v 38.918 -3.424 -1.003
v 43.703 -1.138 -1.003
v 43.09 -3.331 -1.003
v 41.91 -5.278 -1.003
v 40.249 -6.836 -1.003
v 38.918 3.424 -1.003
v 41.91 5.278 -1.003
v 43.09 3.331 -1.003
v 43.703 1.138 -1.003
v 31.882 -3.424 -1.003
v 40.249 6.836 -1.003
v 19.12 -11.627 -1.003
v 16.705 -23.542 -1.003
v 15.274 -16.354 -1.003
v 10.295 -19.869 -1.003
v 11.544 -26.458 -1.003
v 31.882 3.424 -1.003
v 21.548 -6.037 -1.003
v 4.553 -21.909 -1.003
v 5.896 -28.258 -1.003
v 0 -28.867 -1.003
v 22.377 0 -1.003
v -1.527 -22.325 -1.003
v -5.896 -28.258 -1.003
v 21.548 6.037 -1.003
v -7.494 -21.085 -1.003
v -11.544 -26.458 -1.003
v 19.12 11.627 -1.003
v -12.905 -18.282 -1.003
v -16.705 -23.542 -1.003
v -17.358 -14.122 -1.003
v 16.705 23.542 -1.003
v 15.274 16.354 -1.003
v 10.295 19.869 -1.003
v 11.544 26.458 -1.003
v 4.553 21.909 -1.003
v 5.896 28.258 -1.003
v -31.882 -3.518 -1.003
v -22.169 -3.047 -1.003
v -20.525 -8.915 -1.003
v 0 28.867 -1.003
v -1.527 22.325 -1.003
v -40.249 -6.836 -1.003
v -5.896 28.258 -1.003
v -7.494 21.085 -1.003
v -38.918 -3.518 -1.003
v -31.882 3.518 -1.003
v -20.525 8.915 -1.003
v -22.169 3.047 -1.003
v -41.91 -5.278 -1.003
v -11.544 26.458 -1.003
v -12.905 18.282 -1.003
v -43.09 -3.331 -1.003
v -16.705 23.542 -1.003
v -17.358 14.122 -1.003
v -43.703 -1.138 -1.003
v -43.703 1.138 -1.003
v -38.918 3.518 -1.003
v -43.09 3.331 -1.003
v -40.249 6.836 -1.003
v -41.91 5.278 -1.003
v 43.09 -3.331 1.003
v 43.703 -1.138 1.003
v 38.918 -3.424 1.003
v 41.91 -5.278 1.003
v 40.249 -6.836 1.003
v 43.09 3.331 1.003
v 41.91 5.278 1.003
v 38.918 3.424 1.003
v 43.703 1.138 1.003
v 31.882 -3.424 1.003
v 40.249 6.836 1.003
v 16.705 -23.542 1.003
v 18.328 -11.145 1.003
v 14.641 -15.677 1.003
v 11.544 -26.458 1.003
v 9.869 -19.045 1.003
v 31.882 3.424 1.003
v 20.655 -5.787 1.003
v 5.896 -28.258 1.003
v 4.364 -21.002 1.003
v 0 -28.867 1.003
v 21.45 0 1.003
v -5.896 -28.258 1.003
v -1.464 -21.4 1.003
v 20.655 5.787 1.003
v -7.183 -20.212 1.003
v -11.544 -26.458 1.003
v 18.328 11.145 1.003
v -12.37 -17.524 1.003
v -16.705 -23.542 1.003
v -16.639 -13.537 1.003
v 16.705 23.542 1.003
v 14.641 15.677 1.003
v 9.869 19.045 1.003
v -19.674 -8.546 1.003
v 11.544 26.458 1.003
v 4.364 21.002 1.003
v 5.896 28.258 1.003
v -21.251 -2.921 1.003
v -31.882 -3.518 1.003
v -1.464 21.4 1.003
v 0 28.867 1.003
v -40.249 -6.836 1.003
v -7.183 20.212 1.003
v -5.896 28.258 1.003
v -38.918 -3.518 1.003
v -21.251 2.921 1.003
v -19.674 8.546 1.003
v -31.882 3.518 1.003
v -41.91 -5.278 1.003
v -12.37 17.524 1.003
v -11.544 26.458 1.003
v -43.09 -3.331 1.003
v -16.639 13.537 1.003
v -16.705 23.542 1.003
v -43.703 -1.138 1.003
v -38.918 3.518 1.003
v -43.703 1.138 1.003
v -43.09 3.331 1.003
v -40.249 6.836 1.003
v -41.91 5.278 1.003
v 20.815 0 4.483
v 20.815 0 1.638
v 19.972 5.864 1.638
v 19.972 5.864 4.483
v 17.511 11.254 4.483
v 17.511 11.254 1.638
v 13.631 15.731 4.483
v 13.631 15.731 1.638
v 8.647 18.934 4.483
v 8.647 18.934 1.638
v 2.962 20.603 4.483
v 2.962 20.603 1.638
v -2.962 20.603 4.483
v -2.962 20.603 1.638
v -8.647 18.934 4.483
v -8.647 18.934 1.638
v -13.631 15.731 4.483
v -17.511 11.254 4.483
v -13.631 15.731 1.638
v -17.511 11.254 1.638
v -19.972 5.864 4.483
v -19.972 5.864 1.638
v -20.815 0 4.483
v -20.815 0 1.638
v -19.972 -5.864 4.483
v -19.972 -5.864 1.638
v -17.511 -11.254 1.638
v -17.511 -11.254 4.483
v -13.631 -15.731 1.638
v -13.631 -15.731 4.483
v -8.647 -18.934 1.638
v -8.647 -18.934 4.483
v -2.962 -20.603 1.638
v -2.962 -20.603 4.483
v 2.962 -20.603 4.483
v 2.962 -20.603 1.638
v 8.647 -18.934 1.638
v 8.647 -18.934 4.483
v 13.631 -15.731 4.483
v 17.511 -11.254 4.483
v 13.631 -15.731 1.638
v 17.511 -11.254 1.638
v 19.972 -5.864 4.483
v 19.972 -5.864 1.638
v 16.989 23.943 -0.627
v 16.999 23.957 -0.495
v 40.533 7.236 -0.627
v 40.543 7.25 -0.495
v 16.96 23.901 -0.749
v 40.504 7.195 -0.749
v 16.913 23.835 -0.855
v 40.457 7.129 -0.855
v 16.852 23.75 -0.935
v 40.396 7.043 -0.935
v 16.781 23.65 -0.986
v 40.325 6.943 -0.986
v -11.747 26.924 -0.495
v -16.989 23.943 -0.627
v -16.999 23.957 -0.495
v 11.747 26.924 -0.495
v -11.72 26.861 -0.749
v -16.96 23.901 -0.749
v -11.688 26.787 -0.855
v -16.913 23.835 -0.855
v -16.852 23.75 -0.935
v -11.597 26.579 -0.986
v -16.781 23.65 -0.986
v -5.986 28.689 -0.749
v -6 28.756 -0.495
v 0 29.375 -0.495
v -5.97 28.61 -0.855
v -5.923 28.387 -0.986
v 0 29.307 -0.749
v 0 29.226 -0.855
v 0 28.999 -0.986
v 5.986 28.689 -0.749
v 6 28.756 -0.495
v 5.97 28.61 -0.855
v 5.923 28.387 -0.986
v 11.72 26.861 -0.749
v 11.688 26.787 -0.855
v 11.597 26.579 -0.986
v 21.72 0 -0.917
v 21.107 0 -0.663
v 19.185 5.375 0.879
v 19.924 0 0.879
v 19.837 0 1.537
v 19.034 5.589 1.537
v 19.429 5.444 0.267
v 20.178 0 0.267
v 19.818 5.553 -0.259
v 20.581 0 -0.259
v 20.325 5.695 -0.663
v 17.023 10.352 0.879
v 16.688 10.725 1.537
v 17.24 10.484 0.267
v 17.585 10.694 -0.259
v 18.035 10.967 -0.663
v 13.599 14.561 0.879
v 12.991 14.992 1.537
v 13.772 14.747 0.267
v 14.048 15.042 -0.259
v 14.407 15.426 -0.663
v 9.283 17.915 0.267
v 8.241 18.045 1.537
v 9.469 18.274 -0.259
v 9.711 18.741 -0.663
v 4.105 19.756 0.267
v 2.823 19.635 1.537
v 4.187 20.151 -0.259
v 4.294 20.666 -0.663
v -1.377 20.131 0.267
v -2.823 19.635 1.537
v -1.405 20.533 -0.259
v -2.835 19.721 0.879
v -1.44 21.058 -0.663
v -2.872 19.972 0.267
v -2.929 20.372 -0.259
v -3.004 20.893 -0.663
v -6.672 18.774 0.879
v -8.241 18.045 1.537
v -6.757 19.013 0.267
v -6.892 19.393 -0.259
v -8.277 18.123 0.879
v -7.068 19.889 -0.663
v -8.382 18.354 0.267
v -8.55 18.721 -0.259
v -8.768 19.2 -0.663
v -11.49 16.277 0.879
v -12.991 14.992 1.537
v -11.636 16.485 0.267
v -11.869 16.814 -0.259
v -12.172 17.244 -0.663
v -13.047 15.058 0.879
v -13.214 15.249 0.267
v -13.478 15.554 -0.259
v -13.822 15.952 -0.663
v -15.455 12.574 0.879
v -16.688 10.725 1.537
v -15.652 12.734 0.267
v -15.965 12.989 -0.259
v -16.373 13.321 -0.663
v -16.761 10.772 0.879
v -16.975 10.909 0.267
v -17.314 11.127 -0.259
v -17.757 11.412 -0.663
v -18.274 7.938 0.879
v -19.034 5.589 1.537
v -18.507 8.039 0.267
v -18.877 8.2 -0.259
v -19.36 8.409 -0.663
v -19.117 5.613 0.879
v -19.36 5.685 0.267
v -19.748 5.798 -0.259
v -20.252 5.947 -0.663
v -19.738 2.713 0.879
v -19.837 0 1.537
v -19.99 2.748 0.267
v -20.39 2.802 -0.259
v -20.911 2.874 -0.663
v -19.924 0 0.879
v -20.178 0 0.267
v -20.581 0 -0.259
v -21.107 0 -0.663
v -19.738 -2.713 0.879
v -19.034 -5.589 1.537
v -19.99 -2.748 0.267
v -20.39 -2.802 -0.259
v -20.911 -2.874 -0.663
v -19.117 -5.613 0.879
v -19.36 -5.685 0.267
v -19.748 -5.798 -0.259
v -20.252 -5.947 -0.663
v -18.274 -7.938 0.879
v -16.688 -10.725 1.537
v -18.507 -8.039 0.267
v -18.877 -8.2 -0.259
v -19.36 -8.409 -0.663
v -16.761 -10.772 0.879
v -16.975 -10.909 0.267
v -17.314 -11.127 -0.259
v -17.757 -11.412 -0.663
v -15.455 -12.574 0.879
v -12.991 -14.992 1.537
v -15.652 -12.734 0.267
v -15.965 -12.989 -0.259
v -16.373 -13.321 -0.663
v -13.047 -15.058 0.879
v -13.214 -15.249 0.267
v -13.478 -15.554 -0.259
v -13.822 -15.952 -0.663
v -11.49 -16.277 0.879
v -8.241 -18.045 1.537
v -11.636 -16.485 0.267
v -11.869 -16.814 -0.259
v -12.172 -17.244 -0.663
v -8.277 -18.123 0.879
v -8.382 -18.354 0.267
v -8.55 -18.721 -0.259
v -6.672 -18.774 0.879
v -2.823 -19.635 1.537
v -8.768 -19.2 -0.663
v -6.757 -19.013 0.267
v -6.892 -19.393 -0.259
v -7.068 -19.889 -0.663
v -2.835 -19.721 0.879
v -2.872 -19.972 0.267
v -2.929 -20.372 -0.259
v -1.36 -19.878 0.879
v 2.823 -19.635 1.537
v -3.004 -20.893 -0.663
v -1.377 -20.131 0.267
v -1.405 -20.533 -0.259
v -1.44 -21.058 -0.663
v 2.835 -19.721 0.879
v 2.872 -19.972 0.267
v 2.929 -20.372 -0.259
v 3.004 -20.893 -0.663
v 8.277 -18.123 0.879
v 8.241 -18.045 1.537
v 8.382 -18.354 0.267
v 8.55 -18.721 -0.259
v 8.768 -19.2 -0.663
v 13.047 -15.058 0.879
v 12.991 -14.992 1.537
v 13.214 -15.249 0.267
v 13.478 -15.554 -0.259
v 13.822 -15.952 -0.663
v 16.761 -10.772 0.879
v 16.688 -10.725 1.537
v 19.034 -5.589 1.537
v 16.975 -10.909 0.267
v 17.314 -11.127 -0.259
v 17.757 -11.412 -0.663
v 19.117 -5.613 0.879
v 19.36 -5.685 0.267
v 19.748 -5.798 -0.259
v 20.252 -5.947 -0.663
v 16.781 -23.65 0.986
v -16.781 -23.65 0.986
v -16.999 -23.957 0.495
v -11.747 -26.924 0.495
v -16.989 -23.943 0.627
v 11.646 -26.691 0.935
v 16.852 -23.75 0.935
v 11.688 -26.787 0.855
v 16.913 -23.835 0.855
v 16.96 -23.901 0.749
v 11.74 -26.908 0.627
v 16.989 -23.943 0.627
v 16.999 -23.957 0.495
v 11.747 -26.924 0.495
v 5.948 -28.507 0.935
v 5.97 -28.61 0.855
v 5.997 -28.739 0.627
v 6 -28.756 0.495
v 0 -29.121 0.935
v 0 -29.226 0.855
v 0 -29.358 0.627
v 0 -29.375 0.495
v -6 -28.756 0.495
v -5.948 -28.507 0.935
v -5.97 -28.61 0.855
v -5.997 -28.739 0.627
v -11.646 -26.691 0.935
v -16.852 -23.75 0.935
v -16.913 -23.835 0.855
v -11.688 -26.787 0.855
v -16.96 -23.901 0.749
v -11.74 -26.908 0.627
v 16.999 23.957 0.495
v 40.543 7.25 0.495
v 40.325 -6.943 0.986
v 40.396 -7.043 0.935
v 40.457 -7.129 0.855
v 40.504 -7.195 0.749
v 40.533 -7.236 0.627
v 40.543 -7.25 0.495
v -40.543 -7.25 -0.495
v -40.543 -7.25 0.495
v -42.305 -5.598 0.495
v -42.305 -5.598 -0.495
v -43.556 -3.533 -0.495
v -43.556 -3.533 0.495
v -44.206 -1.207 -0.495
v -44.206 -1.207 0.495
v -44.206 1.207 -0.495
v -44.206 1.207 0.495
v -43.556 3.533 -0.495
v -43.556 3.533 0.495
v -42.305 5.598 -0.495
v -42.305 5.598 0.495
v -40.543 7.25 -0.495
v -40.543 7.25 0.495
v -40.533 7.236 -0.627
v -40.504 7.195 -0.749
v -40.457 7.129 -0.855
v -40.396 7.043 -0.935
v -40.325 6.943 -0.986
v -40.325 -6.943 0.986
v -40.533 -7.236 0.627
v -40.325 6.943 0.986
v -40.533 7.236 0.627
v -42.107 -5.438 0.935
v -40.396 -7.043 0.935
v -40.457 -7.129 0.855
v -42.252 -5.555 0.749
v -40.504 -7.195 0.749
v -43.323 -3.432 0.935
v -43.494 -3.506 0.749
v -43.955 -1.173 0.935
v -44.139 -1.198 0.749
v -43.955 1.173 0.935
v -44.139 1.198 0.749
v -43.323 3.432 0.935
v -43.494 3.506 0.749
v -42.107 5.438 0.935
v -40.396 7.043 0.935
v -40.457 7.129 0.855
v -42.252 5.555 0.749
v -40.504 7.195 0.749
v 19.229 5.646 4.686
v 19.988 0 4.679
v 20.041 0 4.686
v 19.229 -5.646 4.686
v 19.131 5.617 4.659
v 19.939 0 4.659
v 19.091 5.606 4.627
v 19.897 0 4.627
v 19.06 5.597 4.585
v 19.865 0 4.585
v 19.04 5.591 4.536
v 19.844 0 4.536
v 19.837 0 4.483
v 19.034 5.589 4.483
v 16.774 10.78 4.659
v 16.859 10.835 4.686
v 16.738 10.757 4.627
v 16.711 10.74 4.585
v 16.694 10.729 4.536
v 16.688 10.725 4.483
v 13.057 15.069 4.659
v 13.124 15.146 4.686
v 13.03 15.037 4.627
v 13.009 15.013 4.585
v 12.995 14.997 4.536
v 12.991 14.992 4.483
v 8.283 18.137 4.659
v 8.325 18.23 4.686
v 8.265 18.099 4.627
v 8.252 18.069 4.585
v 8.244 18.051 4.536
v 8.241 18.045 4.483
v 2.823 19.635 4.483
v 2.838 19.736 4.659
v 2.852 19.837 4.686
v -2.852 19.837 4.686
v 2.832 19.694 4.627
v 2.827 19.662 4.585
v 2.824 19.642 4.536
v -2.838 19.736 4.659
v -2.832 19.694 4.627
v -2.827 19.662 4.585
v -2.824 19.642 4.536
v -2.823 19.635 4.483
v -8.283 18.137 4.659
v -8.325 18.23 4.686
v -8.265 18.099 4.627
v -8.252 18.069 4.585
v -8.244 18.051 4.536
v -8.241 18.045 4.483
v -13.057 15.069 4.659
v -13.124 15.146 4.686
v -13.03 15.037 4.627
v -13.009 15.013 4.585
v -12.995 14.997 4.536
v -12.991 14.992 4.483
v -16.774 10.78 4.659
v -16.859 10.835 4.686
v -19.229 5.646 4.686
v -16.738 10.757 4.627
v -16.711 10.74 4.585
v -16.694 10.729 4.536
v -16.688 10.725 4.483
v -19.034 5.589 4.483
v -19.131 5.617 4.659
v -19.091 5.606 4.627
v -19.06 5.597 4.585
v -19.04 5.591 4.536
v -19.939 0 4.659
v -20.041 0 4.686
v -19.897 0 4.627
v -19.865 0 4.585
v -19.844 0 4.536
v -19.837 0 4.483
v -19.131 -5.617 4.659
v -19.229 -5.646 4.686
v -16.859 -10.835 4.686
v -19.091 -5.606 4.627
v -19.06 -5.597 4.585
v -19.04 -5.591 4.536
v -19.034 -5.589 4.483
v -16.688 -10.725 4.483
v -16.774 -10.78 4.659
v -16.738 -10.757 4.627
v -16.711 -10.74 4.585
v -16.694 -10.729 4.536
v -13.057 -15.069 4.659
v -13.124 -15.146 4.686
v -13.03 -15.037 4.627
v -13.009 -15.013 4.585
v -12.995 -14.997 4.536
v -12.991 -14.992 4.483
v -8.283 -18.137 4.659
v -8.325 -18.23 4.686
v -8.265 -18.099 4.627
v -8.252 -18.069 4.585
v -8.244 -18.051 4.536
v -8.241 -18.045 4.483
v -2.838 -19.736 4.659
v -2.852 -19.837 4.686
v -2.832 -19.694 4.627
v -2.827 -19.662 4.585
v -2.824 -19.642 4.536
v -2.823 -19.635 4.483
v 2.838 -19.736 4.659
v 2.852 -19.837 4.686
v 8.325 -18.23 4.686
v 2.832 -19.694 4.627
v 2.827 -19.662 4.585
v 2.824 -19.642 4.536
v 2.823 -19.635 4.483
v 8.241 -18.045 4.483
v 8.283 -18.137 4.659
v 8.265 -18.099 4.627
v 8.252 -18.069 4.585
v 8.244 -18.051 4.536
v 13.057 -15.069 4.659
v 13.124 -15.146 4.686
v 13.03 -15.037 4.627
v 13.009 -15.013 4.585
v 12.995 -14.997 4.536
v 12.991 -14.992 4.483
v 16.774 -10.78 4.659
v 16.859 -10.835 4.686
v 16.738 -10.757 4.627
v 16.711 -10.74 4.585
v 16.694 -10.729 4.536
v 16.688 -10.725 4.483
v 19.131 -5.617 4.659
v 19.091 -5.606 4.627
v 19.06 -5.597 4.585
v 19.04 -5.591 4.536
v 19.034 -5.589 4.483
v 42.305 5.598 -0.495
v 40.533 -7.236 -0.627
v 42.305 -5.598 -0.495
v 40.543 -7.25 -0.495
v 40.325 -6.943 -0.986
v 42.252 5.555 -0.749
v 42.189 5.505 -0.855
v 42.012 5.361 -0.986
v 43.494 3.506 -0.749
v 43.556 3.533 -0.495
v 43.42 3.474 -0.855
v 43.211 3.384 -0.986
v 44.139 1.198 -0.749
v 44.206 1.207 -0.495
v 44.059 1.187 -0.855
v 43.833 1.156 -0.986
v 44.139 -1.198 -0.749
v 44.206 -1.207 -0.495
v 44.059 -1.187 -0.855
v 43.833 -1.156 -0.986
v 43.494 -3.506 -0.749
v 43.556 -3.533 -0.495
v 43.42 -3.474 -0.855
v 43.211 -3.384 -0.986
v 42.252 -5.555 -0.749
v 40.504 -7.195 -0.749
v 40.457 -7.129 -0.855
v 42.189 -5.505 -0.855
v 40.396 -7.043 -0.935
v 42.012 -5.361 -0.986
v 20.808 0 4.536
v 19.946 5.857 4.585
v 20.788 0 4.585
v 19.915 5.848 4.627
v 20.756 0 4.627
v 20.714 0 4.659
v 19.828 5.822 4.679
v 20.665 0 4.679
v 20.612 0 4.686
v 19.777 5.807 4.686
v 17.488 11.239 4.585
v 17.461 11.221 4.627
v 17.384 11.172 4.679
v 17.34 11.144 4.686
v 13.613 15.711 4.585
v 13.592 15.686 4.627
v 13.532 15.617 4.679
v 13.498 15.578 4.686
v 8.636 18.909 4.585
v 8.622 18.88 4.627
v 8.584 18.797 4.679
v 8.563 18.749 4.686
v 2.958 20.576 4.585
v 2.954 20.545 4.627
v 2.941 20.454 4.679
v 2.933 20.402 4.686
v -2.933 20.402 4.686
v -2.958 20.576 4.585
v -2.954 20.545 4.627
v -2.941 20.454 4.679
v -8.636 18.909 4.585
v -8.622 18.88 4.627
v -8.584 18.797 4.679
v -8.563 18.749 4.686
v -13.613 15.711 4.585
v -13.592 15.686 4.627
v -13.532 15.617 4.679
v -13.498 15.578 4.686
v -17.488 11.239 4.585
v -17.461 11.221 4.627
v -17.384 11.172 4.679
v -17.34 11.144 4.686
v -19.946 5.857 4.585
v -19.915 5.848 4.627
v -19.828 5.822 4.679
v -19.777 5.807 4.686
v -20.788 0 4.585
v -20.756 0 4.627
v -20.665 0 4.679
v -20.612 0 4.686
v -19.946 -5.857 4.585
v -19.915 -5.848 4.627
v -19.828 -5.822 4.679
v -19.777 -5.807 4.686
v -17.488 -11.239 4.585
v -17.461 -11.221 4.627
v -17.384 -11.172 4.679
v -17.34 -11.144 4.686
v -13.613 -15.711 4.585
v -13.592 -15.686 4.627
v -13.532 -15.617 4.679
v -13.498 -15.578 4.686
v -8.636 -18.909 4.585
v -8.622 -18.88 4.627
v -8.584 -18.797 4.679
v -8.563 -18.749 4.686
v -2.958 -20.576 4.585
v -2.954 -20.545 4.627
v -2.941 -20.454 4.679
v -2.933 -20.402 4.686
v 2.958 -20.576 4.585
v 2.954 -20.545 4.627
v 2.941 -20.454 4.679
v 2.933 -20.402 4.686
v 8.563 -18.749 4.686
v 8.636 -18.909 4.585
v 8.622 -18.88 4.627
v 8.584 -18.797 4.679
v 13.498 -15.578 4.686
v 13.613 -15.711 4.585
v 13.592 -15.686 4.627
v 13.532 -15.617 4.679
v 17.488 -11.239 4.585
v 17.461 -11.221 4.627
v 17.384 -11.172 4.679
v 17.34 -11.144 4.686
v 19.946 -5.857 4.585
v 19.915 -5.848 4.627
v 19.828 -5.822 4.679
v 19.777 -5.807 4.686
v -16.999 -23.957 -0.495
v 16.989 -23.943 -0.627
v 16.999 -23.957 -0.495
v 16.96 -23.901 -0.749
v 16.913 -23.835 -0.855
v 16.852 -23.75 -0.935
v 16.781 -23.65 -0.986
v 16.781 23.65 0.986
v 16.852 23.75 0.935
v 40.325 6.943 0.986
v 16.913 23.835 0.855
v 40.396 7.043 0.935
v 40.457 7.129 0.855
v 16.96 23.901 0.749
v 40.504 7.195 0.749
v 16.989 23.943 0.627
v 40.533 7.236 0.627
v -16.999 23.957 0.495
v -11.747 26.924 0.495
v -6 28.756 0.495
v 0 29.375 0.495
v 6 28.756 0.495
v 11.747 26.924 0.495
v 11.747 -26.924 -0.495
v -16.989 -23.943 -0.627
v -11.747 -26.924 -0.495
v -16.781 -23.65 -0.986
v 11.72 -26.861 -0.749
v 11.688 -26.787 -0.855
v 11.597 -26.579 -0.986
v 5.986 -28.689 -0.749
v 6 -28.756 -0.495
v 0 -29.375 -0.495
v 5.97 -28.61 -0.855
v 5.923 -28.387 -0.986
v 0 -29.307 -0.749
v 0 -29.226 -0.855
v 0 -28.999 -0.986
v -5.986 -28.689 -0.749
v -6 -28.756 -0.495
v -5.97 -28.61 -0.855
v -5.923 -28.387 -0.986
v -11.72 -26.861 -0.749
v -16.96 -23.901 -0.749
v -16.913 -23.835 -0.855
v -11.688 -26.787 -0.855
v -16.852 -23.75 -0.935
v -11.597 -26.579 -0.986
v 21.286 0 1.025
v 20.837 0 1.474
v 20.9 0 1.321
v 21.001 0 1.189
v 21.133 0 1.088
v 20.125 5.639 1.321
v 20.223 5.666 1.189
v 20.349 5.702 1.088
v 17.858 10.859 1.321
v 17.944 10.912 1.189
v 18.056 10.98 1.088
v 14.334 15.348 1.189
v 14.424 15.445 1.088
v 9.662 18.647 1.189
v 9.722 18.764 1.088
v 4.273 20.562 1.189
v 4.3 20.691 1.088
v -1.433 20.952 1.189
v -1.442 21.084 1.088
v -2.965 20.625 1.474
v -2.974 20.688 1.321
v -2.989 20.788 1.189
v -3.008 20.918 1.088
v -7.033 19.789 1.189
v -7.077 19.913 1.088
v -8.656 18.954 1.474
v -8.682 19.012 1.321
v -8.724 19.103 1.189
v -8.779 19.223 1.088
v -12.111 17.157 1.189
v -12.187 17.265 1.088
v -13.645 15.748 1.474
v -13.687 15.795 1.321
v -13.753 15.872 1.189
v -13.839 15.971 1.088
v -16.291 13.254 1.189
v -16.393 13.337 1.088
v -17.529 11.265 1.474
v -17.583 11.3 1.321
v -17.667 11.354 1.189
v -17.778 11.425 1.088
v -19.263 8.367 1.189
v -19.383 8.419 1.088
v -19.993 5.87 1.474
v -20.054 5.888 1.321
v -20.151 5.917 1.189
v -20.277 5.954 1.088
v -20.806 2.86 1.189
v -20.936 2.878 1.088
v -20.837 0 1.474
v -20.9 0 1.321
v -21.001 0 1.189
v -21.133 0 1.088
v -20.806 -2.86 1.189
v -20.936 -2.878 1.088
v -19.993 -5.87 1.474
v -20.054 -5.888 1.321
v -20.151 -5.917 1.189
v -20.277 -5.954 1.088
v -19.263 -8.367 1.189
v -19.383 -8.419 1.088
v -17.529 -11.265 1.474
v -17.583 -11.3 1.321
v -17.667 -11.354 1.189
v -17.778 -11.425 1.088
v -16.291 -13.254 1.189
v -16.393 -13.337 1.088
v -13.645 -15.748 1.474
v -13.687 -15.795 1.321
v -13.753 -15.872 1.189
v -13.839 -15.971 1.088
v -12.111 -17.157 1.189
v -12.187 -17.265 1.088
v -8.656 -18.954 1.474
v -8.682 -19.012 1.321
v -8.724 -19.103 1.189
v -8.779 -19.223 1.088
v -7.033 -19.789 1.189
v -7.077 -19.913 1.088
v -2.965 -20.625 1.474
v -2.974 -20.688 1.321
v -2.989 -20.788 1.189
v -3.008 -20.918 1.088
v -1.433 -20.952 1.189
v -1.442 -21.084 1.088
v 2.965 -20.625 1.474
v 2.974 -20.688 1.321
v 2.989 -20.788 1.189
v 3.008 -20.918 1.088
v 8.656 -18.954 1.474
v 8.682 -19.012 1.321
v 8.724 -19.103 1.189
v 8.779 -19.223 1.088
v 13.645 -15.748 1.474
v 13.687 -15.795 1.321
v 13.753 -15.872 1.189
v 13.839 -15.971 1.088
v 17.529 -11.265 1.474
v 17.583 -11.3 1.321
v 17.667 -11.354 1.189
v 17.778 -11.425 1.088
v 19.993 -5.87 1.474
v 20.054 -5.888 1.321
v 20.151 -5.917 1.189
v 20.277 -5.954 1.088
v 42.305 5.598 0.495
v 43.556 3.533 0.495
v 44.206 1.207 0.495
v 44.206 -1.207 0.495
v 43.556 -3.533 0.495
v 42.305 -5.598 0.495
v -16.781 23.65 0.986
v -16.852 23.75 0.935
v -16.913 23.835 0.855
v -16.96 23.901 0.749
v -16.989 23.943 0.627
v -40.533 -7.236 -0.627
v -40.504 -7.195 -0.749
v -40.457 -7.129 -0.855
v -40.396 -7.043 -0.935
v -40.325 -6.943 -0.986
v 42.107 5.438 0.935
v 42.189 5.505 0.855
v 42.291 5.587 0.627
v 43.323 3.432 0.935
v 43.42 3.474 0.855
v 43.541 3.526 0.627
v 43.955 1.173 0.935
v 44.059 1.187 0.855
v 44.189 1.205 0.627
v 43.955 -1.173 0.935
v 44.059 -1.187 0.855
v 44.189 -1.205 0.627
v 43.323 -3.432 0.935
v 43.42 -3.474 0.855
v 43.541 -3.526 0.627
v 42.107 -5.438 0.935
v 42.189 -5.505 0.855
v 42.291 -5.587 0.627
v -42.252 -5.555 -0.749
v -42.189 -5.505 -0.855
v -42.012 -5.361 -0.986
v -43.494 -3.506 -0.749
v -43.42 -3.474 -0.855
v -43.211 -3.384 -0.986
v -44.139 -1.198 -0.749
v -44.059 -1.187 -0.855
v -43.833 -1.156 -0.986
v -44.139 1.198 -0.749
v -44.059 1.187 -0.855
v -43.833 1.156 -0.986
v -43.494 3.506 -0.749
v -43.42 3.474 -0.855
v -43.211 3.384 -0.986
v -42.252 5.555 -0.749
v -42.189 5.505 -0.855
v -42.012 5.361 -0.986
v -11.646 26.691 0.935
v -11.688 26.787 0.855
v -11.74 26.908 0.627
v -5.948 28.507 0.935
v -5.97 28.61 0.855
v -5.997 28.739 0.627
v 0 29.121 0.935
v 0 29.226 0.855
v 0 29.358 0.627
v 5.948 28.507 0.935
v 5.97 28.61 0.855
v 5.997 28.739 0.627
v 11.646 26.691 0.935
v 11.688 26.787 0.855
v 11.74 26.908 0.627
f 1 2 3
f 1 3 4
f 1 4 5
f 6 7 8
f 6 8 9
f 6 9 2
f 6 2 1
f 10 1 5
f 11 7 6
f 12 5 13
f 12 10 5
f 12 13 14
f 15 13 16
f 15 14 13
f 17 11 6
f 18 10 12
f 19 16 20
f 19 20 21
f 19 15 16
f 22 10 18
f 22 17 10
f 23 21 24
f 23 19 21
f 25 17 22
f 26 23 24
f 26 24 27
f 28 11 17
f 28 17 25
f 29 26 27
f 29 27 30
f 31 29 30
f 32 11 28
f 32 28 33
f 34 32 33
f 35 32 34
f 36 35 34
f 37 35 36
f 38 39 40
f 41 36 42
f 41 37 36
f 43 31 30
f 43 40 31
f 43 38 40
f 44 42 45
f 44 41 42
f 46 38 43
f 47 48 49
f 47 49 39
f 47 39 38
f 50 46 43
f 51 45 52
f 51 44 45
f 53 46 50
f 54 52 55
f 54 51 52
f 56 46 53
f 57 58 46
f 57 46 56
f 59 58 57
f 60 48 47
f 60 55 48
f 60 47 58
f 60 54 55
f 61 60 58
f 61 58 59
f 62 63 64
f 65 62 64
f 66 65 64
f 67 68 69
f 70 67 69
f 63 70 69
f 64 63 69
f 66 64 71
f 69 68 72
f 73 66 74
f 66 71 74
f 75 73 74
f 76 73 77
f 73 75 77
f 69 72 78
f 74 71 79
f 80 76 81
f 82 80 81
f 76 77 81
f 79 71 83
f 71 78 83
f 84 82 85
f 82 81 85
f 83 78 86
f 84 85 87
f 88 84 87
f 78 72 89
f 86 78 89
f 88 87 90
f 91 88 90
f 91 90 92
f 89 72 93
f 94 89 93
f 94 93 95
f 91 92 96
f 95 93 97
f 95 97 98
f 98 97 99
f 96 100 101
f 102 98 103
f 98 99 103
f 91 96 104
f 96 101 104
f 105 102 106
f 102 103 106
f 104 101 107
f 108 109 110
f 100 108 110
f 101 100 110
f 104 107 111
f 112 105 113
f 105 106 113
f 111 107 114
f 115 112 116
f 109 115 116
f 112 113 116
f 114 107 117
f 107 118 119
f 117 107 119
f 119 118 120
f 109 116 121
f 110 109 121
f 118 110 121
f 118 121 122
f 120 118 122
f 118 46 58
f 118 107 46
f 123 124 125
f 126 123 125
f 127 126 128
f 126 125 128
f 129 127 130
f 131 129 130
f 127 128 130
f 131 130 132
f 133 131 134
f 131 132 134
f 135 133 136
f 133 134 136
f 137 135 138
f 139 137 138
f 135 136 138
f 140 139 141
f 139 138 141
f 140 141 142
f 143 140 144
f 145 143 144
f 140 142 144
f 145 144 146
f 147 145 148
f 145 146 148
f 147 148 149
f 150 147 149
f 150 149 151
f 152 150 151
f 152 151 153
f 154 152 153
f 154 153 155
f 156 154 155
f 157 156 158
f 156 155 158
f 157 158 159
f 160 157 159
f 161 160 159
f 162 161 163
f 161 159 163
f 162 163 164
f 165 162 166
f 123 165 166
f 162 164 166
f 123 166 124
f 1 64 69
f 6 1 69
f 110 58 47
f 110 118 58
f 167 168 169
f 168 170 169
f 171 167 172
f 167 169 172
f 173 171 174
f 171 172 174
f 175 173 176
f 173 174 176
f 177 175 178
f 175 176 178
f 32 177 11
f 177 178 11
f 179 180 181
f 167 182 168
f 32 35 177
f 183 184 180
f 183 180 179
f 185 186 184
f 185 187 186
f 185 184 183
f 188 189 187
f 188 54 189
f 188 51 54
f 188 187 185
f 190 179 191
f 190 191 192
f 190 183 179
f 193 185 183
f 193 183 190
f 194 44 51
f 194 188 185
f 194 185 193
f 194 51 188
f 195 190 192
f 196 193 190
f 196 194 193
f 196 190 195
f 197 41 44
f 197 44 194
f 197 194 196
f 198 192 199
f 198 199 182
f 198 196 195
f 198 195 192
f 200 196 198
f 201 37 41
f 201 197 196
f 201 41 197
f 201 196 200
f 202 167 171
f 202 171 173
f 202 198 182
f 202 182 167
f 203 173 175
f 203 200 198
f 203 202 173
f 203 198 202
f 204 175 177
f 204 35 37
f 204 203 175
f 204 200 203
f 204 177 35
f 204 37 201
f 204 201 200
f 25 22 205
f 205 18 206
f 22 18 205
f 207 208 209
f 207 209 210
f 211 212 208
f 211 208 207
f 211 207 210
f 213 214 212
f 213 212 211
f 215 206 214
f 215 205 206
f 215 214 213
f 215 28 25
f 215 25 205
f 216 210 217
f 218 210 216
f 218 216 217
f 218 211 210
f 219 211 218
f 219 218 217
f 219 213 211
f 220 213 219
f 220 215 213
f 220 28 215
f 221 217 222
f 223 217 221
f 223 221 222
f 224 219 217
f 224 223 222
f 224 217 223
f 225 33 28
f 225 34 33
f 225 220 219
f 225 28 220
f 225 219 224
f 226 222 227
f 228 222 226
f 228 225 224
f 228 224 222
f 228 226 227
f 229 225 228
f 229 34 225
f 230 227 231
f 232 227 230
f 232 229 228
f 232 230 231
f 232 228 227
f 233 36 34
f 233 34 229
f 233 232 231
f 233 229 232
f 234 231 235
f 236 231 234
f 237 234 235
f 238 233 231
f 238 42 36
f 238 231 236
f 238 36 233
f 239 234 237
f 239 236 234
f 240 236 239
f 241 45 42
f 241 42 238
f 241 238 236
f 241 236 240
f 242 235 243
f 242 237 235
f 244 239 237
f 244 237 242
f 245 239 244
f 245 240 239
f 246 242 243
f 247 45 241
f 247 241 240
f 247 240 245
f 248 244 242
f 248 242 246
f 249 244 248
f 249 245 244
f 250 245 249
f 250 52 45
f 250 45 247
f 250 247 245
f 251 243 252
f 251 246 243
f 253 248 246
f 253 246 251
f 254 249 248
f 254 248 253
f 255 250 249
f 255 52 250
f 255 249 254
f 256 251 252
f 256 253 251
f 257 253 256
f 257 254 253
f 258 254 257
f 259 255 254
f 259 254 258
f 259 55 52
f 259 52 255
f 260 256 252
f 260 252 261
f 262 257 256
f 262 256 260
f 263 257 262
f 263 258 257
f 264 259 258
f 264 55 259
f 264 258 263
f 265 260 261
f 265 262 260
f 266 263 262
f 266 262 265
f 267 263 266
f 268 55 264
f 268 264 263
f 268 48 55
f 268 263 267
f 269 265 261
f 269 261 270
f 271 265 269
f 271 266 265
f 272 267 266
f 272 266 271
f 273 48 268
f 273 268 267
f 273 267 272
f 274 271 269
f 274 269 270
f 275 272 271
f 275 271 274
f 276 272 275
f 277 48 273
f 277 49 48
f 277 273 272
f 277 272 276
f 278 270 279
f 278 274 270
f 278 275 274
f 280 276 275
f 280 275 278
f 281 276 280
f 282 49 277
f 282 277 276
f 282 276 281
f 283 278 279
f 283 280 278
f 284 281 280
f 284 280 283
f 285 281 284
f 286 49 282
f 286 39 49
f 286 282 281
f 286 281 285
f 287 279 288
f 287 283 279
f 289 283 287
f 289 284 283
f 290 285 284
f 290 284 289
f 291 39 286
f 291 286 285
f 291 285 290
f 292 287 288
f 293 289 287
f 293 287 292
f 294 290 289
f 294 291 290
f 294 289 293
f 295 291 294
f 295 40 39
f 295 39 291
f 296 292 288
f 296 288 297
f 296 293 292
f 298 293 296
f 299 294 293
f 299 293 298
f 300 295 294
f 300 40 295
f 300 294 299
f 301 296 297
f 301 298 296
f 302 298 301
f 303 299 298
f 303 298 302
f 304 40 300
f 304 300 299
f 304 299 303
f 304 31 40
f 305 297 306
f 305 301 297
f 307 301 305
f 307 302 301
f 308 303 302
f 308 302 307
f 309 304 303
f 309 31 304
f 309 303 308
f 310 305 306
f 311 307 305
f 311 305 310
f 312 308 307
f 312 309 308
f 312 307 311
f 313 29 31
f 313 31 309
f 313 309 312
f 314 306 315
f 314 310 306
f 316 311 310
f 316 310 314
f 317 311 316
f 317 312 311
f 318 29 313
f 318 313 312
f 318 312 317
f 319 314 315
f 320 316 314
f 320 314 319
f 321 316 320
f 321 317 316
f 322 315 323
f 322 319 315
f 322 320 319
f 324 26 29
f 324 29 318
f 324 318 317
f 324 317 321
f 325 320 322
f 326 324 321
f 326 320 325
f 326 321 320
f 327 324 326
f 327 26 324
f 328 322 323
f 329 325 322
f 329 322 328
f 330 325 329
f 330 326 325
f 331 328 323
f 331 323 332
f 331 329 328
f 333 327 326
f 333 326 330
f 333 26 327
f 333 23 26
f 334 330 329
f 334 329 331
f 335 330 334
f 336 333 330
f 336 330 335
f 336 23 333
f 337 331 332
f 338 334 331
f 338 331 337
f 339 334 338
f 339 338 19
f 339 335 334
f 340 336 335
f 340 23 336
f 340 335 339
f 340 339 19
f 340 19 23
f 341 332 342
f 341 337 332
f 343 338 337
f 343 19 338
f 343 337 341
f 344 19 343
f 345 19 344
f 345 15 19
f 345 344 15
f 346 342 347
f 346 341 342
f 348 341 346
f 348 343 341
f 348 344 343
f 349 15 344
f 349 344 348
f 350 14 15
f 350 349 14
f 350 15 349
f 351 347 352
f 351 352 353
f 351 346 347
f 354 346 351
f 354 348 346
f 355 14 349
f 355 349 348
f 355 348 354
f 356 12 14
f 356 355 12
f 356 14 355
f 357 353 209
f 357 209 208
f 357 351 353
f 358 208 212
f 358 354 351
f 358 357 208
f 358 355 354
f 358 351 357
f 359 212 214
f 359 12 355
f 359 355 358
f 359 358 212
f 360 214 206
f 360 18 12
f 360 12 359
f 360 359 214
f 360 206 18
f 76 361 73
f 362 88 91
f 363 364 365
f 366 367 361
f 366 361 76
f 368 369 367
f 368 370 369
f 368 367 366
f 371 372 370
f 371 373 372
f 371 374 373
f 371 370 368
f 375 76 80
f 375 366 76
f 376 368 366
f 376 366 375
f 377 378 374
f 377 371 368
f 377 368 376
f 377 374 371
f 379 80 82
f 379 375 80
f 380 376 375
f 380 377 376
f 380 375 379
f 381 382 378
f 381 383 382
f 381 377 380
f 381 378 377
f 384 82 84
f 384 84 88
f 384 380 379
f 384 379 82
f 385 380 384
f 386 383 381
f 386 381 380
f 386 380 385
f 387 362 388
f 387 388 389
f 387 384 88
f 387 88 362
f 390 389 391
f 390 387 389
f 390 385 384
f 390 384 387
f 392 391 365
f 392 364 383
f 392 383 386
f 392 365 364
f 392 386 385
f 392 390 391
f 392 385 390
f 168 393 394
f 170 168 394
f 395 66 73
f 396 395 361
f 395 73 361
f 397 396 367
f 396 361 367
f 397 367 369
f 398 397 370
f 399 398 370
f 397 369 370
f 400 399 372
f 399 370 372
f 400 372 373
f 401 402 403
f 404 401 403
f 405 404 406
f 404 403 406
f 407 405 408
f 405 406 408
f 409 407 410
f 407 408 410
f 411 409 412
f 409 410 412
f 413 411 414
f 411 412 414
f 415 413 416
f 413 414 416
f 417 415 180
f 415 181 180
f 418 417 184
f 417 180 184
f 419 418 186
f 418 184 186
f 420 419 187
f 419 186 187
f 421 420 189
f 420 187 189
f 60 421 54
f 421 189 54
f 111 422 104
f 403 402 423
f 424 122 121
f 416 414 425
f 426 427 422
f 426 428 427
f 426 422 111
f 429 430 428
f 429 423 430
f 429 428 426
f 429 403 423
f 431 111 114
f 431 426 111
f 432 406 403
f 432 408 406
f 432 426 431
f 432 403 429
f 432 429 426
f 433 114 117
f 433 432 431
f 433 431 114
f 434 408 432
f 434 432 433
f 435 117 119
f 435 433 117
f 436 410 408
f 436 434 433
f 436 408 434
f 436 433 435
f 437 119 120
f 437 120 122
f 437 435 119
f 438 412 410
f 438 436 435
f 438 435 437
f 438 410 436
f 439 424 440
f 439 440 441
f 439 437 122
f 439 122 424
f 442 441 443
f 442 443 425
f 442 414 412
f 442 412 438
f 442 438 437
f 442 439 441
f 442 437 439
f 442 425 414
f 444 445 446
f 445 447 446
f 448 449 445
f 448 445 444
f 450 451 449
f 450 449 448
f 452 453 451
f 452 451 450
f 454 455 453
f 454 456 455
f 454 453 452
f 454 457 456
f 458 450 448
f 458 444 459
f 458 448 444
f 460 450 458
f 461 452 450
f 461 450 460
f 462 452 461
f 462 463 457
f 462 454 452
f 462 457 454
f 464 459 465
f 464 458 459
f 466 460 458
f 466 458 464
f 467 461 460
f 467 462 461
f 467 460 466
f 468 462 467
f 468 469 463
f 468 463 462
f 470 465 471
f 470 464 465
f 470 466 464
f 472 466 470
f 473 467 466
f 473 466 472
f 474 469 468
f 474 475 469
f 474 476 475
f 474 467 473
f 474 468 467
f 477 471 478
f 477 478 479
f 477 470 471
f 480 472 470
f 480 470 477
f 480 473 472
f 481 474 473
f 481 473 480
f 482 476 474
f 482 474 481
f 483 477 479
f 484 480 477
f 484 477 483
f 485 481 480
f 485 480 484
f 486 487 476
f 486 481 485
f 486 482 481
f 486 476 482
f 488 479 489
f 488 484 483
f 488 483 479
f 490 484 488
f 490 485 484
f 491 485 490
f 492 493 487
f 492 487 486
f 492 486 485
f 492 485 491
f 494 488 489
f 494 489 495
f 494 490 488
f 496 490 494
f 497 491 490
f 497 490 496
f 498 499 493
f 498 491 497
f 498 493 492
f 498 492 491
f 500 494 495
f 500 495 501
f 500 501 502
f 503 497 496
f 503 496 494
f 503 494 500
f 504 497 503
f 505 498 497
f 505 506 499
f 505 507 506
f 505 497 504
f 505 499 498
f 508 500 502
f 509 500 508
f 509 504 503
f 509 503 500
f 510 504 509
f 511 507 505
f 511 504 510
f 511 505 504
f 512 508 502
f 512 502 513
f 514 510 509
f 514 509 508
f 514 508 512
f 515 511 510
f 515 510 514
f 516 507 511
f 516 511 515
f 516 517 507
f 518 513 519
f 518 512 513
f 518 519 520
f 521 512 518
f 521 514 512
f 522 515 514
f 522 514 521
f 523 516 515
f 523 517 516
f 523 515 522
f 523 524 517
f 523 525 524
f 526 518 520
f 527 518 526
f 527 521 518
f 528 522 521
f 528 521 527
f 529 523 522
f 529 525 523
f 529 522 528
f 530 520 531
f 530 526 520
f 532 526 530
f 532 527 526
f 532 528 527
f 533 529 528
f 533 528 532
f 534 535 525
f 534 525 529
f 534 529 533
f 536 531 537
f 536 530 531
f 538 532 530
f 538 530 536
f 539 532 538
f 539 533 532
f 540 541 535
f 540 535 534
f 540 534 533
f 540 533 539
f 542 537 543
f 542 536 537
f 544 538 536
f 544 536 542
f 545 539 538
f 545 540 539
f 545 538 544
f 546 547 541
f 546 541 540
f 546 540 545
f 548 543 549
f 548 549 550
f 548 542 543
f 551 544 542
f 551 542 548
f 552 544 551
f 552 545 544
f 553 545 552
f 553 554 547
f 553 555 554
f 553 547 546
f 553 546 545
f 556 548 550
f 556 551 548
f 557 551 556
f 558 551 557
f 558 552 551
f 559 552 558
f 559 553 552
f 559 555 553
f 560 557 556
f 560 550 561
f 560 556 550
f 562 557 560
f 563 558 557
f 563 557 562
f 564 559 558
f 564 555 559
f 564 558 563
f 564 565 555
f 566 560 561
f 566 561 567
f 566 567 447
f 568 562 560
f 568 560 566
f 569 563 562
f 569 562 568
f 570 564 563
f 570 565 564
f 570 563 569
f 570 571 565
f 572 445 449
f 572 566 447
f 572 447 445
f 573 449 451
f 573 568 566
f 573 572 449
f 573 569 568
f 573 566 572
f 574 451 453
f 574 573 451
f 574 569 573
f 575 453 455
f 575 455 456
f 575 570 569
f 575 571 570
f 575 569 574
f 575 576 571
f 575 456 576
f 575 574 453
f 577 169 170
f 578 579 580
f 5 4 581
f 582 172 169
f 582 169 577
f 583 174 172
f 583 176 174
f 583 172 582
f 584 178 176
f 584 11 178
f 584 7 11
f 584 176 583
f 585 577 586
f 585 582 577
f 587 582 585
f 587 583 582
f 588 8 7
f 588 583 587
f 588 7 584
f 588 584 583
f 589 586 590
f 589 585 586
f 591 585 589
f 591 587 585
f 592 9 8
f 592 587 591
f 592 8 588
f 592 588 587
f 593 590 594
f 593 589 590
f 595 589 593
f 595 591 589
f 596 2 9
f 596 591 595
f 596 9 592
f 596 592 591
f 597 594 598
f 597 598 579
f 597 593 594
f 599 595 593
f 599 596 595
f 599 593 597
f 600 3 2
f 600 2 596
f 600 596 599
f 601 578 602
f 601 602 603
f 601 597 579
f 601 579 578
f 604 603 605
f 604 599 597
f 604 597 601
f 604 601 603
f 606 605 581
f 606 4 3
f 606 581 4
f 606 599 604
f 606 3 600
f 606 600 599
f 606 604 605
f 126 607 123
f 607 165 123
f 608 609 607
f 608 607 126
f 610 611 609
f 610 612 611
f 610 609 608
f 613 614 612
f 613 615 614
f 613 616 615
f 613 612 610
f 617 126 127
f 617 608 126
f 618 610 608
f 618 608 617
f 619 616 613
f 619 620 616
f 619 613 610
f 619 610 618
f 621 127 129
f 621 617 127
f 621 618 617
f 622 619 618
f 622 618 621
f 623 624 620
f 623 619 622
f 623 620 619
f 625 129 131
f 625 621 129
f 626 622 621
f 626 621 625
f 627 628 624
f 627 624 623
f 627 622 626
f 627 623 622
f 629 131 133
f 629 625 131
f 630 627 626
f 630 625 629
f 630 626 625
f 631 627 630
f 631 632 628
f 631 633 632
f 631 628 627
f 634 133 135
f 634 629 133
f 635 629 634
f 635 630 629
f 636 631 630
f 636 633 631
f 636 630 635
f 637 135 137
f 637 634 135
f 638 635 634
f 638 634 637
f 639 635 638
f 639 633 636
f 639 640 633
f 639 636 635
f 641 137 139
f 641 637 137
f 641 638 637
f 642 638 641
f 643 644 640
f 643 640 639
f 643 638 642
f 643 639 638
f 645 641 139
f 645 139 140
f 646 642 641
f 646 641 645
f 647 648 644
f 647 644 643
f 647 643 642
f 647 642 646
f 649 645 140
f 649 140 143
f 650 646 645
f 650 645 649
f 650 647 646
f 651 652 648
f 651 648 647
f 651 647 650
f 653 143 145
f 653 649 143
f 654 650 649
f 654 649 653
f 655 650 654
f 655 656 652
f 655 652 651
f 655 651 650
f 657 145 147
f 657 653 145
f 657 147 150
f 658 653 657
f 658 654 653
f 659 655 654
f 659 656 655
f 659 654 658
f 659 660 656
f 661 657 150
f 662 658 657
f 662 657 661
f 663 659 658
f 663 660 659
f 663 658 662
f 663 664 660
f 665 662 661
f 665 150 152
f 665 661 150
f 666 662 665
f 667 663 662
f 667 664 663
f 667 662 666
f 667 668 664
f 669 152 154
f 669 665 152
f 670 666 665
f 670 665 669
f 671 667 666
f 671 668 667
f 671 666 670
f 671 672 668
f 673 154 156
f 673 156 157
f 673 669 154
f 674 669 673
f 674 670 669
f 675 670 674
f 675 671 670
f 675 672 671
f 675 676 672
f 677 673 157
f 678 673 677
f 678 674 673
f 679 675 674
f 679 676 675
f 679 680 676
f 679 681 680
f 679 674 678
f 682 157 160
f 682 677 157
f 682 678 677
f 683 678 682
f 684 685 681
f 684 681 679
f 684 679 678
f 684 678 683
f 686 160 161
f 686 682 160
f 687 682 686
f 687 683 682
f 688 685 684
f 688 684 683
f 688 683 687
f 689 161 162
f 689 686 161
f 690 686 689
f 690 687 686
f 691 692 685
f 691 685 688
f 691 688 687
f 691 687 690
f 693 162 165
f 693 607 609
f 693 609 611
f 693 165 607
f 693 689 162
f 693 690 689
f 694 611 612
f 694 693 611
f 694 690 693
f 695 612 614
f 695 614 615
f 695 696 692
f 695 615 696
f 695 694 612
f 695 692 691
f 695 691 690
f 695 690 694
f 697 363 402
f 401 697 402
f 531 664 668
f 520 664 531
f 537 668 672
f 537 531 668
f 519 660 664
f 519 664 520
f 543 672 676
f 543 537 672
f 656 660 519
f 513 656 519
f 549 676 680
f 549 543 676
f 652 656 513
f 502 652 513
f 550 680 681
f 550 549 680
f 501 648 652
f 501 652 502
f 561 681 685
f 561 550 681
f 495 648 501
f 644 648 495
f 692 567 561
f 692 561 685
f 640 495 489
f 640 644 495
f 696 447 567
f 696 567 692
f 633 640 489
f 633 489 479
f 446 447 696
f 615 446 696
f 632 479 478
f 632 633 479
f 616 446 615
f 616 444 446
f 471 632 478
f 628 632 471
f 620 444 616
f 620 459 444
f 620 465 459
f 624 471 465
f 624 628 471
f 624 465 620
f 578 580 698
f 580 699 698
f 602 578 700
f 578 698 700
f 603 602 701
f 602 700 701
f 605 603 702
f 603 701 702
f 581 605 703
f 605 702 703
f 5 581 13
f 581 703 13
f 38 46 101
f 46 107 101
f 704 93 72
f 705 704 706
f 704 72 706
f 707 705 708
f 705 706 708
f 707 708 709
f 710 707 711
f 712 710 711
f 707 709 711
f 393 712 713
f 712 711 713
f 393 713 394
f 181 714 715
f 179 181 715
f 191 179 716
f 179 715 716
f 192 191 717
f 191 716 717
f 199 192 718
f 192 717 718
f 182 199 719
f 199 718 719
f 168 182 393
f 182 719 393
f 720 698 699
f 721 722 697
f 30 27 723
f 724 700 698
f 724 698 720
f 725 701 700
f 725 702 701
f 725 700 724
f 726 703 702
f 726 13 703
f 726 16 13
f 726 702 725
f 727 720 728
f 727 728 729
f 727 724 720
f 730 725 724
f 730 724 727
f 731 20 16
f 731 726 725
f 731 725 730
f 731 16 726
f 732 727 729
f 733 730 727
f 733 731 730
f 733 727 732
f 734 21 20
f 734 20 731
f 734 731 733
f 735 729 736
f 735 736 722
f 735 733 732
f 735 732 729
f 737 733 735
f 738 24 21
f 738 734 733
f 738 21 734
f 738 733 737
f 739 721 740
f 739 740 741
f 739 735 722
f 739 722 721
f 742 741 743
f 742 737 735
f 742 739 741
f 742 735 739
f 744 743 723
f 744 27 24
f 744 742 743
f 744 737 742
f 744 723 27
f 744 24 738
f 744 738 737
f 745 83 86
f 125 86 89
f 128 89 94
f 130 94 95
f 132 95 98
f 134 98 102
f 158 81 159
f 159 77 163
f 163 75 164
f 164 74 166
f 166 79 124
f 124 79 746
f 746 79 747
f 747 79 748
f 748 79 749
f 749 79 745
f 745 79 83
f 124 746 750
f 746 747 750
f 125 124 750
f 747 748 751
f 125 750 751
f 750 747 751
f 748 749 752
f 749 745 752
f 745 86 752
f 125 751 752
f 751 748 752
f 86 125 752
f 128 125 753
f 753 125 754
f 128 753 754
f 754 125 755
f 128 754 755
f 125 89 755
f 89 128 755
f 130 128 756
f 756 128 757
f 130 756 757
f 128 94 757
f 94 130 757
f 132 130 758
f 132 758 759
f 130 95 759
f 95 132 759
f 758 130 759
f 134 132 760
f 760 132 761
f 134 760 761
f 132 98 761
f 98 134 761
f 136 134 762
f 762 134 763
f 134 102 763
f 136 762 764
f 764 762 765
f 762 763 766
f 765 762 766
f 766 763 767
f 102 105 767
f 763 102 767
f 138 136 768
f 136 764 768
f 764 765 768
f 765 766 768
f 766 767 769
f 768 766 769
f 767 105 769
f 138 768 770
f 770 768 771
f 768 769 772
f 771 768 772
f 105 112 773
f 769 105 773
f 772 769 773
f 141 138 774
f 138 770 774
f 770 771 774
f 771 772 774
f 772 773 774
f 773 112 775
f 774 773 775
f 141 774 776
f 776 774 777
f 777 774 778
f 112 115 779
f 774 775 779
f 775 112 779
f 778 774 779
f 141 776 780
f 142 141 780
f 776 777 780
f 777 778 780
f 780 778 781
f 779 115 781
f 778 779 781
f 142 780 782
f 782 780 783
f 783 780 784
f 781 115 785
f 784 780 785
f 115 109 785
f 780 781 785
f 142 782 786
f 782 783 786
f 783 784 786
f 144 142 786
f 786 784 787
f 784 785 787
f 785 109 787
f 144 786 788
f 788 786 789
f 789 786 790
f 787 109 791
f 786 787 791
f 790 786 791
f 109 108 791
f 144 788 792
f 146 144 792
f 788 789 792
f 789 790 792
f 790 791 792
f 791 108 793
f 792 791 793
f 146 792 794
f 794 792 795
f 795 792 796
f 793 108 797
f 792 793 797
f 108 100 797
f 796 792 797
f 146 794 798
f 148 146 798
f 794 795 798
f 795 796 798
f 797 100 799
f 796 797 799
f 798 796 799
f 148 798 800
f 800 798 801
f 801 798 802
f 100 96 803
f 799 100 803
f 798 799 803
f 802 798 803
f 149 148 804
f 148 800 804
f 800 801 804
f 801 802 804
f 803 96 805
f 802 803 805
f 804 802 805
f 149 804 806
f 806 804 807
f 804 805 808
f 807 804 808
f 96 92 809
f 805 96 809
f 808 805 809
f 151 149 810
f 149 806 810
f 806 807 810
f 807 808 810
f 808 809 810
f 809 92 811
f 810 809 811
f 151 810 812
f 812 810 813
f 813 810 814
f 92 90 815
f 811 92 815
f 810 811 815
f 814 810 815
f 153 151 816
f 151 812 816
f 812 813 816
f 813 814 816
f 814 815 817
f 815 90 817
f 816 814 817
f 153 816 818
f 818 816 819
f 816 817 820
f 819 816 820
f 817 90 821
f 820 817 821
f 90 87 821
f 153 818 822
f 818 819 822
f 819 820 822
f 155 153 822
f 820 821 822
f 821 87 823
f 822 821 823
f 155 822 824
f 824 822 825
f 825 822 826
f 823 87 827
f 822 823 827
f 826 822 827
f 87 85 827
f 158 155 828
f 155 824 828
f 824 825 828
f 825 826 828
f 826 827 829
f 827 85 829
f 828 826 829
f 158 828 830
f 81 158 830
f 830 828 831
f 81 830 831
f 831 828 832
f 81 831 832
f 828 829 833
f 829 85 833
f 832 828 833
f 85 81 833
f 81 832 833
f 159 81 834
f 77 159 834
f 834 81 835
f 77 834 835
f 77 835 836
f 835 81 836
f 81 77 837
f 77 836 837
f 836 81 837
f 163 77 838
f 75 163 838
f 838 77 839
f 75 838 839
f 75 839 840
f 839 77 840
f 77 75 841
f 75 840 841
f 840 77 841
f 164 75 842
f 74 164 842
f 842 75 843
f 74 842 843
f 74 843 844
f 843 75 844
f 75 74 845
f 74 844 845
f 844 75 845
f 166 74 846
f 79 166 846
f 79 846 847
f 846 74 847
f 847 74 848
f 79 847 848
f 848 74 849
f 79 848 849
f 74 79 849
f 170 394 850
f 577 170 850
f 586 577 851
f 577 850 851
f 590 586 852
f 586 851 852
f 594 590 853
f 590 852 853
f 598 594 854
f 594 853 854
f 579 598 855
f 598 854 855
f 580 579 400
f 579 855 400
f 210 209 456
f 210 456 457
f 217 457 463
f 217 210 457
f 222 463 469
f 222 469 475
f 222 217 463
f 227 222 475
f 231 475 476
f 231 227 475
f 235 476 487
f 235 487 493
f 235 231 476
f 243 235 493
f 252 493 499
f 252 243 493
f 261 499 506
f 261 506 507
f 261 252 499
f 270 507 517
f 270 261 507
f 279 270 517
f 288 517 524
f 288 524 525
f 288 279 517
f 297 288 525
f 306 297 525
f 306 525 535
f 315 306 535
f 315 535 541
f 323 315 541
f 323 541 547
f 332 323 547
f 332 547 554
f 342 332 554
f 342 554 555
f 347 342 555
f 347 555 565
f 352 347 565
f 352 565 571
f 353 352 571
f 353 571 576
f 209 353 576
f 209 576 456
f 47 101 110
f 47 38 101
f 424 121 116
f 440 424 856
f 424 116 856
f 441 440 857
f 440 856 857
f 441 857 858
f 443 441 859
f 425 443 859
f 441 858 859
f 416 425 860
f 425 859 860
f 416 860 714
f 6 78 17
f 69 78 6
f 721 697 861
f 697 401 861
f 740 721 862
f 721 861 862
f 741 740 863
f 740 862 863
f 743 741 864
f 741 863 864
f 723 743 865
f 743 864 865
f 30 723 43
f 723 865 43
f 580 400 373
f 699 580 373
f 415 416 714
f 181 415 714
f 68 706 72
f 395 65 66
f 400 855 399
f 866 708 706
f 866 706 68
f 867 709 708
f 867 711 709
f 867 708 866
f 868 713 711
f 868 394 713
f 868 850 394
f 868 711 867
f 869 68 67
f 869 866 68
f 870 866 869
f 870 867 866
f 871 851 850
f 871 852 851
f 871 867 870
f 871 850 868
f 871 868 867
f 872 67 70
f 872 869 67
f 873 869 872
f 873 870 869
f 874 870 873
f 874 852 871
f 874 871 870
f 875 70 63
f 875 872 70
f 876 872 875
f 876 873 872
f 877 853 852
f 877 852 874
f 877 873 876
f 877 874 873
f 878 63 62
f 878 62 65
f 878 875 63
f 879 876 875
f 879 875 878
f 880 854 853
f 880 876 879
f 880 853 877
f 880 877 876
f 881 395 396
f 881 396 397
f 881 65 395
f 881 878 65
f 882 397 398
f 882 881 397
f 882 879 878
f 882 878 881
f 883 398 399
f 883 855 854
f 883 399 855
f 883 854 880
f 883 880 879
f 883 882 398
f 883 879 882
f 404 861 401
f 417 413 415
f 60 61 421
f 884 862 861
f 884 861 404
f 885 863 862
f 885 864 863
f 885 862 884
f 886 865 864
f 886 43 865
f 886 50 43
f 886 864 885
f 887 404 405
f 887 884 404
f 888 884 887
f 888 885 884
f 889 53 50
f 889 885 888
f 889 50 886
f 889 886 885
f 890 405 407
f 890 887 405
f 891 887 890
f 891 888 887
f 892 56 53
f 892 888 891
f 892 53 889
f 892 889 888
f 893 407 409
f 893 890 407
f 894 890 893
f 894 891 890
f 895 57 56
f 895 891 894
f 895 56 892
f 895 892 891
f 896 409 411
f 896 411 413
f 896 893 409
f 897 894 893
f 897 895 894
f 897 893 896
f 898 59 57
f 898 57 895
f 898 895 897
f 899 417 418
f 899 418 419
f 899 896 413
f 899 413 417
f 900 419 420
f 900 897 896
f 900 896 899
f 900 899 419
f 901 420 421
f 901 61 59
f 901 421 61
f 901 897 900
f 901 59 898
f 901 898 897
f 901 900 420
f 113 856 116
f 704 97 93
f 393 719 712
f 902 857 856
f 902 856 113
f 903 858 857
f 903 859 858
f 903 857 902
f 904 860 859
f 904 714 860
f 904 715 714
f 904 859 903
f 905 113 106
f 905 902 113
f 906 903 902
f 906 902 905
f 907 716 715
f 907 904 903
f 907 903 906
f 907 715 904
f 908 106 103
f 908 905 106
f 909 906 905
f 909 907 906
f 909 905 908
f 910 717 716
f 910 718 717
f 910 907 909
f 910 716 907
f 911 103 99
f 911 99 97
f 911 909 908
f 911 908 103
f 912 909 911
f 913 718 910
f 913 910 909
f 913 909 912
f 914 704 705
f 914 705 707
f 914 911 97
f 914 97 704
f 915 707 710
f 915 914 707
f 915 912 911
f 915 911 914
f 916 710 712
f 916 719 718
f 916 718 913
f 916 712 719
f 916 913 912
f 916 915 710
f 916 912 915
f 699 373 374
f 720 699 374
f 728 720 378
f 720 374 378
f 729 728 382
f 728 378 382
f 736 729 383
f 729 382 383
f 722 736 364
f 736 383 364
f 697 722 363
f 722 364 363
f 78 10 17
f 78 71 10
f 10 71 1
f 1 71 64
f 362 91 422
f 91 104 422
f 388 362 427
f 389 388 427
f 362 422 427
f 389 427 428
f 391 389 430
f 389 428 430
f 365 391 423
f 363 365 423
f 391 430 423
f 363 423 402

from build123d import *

# Parameters (mm, degrees)
SKETCH1_R      = 19.8374
SKETCH1_W      = 7.0358
SKETCH1_H      = 7.0358
SKETCH1_H_2    = 6.84784
EXTRUDE1_DEPTH = 1.0033
SKETCH2_R      = 20.8153
SKETCH2_R_2    = 19.8374
EXTRUDE2_DEPTH = 3.683
FILLET1_R      = 2.54
FILLET2_R      = 0.635
FILLET3_R      = 0.508
FILLET4_R      = 0.2032


with BuildPart() as part:
    # Sketch1 → Extrude1 (new, symmetric)
    with BuildSketch(Plane.XY):
        with BuildLine():
            Line((16.999259606, 23.95666239), (40.543319479, 7.250178847))
            ThreePointArc((40.543319479, 7.250178847), (44.28871, 0), (40.543319479, -7.250178847))
            Line((40.543319479, -7.250178847), (16.999259606, -23.95666239))
            ThreePointArc((16.999259606, -23.95666239), (0, -29.3751), (-16.999259606, -23.95666239))
            Line((-16.999259606, -23.95666239), (-40.543319479, -7.250178847))
            ThreePointArc((-40.543319479, -7.250178847), (-44.28871, 0), (-40.543319479, 7.250178847))
            Line((-40.543319479, 7.250178847), (-16.999259606, 23.95666239))
            ThreePointArc((-16.999259606, 23.95666239), (0, 29.3751), (16.999259606, 23.95666239))
        make_face()
        Circle(SKETCH1_R, mode=Mode.SUBTRACT)
        with Locations((-35.39998, 0)):
            Rectangle(SKETCH1_W, SKETCH1_H, mode=Mode.SUBTRACT)
        with Locations((35.39998, 0)):
            Rectangle(SKETCH1_W, SKETCH1_H_2, mode=Mode.SUBTRACT)
    extrude(amount=EXTRUDE1_DEPTH, both=True)

    # Sketch2 → Extrude2 (add)
    with BuildSketch(Plane.XY.offset(1.0033)):
        Circle(SKETCH2_R)
        Circle(SKETCH2_R_2, mode=Mode.SUBTRACT)
    extrude(amount=EXTRUDE2_DEPTH)

    # Fillet1
    fillet1_edges = [part.edges().sort_by_distance(p)[0] for p in [
        (-19.8374, 0, -1.0033),
    ]]
    fillet(fillet1_edges, radius=FILLET1_R)

    # Fillet2
    fillet2_edges = [part.edges().sort_by_distance(p)[0] for p in [
        (-20.8153, 0, 1.0033),
    ]]
    fillet(fillet2_edges, radius=FILLET2_R)

    # Fillet3
    fillet3_edges = [part.edges().sort_by_distance(p)[0] for p in [
        (-44.28871, 0, 1.0033),
        (-28.771289542, 15.603420618, -1.0033),
        (0, 29.3751, -1.0033),
        (-28.771289542, -15.603420618, 1.0033),
        (0, -29.3751, 1.0033),
        (28.771289542, -15.603420618, 1.0033),
        (44.28871, 0, 1.0033),
        (28.771289542, 15.603420618, 1.0033),
        (0, 29.3751, 1.0033),
        (-28.771289542, 15.603420618, 1.0033),
        (28.771289542, 15.603420618, -1.0033),
        (44.28871, 0, -1.0033),
        (28.771289542, -15.603420618, -1.0033),
        (0, -29.3751, -1.0033),
        (-28.771289542, -15.603420618, -1.0033),
        (-44.28871, 0, -1.0033),
    ]]
    fillet(fillet3_edges, radius=FILLET3_R)

    # Fillet4
    fillet4_edges = [part.edges().sort_by_distance(p)[0] for p in [
        (-20.8153, 0, 4.6863),
        (-19.8374, 0, 4.6863),
    ]]
    fillet(fillet4_edges, radius=FILLET4_R)


solid = part.part
